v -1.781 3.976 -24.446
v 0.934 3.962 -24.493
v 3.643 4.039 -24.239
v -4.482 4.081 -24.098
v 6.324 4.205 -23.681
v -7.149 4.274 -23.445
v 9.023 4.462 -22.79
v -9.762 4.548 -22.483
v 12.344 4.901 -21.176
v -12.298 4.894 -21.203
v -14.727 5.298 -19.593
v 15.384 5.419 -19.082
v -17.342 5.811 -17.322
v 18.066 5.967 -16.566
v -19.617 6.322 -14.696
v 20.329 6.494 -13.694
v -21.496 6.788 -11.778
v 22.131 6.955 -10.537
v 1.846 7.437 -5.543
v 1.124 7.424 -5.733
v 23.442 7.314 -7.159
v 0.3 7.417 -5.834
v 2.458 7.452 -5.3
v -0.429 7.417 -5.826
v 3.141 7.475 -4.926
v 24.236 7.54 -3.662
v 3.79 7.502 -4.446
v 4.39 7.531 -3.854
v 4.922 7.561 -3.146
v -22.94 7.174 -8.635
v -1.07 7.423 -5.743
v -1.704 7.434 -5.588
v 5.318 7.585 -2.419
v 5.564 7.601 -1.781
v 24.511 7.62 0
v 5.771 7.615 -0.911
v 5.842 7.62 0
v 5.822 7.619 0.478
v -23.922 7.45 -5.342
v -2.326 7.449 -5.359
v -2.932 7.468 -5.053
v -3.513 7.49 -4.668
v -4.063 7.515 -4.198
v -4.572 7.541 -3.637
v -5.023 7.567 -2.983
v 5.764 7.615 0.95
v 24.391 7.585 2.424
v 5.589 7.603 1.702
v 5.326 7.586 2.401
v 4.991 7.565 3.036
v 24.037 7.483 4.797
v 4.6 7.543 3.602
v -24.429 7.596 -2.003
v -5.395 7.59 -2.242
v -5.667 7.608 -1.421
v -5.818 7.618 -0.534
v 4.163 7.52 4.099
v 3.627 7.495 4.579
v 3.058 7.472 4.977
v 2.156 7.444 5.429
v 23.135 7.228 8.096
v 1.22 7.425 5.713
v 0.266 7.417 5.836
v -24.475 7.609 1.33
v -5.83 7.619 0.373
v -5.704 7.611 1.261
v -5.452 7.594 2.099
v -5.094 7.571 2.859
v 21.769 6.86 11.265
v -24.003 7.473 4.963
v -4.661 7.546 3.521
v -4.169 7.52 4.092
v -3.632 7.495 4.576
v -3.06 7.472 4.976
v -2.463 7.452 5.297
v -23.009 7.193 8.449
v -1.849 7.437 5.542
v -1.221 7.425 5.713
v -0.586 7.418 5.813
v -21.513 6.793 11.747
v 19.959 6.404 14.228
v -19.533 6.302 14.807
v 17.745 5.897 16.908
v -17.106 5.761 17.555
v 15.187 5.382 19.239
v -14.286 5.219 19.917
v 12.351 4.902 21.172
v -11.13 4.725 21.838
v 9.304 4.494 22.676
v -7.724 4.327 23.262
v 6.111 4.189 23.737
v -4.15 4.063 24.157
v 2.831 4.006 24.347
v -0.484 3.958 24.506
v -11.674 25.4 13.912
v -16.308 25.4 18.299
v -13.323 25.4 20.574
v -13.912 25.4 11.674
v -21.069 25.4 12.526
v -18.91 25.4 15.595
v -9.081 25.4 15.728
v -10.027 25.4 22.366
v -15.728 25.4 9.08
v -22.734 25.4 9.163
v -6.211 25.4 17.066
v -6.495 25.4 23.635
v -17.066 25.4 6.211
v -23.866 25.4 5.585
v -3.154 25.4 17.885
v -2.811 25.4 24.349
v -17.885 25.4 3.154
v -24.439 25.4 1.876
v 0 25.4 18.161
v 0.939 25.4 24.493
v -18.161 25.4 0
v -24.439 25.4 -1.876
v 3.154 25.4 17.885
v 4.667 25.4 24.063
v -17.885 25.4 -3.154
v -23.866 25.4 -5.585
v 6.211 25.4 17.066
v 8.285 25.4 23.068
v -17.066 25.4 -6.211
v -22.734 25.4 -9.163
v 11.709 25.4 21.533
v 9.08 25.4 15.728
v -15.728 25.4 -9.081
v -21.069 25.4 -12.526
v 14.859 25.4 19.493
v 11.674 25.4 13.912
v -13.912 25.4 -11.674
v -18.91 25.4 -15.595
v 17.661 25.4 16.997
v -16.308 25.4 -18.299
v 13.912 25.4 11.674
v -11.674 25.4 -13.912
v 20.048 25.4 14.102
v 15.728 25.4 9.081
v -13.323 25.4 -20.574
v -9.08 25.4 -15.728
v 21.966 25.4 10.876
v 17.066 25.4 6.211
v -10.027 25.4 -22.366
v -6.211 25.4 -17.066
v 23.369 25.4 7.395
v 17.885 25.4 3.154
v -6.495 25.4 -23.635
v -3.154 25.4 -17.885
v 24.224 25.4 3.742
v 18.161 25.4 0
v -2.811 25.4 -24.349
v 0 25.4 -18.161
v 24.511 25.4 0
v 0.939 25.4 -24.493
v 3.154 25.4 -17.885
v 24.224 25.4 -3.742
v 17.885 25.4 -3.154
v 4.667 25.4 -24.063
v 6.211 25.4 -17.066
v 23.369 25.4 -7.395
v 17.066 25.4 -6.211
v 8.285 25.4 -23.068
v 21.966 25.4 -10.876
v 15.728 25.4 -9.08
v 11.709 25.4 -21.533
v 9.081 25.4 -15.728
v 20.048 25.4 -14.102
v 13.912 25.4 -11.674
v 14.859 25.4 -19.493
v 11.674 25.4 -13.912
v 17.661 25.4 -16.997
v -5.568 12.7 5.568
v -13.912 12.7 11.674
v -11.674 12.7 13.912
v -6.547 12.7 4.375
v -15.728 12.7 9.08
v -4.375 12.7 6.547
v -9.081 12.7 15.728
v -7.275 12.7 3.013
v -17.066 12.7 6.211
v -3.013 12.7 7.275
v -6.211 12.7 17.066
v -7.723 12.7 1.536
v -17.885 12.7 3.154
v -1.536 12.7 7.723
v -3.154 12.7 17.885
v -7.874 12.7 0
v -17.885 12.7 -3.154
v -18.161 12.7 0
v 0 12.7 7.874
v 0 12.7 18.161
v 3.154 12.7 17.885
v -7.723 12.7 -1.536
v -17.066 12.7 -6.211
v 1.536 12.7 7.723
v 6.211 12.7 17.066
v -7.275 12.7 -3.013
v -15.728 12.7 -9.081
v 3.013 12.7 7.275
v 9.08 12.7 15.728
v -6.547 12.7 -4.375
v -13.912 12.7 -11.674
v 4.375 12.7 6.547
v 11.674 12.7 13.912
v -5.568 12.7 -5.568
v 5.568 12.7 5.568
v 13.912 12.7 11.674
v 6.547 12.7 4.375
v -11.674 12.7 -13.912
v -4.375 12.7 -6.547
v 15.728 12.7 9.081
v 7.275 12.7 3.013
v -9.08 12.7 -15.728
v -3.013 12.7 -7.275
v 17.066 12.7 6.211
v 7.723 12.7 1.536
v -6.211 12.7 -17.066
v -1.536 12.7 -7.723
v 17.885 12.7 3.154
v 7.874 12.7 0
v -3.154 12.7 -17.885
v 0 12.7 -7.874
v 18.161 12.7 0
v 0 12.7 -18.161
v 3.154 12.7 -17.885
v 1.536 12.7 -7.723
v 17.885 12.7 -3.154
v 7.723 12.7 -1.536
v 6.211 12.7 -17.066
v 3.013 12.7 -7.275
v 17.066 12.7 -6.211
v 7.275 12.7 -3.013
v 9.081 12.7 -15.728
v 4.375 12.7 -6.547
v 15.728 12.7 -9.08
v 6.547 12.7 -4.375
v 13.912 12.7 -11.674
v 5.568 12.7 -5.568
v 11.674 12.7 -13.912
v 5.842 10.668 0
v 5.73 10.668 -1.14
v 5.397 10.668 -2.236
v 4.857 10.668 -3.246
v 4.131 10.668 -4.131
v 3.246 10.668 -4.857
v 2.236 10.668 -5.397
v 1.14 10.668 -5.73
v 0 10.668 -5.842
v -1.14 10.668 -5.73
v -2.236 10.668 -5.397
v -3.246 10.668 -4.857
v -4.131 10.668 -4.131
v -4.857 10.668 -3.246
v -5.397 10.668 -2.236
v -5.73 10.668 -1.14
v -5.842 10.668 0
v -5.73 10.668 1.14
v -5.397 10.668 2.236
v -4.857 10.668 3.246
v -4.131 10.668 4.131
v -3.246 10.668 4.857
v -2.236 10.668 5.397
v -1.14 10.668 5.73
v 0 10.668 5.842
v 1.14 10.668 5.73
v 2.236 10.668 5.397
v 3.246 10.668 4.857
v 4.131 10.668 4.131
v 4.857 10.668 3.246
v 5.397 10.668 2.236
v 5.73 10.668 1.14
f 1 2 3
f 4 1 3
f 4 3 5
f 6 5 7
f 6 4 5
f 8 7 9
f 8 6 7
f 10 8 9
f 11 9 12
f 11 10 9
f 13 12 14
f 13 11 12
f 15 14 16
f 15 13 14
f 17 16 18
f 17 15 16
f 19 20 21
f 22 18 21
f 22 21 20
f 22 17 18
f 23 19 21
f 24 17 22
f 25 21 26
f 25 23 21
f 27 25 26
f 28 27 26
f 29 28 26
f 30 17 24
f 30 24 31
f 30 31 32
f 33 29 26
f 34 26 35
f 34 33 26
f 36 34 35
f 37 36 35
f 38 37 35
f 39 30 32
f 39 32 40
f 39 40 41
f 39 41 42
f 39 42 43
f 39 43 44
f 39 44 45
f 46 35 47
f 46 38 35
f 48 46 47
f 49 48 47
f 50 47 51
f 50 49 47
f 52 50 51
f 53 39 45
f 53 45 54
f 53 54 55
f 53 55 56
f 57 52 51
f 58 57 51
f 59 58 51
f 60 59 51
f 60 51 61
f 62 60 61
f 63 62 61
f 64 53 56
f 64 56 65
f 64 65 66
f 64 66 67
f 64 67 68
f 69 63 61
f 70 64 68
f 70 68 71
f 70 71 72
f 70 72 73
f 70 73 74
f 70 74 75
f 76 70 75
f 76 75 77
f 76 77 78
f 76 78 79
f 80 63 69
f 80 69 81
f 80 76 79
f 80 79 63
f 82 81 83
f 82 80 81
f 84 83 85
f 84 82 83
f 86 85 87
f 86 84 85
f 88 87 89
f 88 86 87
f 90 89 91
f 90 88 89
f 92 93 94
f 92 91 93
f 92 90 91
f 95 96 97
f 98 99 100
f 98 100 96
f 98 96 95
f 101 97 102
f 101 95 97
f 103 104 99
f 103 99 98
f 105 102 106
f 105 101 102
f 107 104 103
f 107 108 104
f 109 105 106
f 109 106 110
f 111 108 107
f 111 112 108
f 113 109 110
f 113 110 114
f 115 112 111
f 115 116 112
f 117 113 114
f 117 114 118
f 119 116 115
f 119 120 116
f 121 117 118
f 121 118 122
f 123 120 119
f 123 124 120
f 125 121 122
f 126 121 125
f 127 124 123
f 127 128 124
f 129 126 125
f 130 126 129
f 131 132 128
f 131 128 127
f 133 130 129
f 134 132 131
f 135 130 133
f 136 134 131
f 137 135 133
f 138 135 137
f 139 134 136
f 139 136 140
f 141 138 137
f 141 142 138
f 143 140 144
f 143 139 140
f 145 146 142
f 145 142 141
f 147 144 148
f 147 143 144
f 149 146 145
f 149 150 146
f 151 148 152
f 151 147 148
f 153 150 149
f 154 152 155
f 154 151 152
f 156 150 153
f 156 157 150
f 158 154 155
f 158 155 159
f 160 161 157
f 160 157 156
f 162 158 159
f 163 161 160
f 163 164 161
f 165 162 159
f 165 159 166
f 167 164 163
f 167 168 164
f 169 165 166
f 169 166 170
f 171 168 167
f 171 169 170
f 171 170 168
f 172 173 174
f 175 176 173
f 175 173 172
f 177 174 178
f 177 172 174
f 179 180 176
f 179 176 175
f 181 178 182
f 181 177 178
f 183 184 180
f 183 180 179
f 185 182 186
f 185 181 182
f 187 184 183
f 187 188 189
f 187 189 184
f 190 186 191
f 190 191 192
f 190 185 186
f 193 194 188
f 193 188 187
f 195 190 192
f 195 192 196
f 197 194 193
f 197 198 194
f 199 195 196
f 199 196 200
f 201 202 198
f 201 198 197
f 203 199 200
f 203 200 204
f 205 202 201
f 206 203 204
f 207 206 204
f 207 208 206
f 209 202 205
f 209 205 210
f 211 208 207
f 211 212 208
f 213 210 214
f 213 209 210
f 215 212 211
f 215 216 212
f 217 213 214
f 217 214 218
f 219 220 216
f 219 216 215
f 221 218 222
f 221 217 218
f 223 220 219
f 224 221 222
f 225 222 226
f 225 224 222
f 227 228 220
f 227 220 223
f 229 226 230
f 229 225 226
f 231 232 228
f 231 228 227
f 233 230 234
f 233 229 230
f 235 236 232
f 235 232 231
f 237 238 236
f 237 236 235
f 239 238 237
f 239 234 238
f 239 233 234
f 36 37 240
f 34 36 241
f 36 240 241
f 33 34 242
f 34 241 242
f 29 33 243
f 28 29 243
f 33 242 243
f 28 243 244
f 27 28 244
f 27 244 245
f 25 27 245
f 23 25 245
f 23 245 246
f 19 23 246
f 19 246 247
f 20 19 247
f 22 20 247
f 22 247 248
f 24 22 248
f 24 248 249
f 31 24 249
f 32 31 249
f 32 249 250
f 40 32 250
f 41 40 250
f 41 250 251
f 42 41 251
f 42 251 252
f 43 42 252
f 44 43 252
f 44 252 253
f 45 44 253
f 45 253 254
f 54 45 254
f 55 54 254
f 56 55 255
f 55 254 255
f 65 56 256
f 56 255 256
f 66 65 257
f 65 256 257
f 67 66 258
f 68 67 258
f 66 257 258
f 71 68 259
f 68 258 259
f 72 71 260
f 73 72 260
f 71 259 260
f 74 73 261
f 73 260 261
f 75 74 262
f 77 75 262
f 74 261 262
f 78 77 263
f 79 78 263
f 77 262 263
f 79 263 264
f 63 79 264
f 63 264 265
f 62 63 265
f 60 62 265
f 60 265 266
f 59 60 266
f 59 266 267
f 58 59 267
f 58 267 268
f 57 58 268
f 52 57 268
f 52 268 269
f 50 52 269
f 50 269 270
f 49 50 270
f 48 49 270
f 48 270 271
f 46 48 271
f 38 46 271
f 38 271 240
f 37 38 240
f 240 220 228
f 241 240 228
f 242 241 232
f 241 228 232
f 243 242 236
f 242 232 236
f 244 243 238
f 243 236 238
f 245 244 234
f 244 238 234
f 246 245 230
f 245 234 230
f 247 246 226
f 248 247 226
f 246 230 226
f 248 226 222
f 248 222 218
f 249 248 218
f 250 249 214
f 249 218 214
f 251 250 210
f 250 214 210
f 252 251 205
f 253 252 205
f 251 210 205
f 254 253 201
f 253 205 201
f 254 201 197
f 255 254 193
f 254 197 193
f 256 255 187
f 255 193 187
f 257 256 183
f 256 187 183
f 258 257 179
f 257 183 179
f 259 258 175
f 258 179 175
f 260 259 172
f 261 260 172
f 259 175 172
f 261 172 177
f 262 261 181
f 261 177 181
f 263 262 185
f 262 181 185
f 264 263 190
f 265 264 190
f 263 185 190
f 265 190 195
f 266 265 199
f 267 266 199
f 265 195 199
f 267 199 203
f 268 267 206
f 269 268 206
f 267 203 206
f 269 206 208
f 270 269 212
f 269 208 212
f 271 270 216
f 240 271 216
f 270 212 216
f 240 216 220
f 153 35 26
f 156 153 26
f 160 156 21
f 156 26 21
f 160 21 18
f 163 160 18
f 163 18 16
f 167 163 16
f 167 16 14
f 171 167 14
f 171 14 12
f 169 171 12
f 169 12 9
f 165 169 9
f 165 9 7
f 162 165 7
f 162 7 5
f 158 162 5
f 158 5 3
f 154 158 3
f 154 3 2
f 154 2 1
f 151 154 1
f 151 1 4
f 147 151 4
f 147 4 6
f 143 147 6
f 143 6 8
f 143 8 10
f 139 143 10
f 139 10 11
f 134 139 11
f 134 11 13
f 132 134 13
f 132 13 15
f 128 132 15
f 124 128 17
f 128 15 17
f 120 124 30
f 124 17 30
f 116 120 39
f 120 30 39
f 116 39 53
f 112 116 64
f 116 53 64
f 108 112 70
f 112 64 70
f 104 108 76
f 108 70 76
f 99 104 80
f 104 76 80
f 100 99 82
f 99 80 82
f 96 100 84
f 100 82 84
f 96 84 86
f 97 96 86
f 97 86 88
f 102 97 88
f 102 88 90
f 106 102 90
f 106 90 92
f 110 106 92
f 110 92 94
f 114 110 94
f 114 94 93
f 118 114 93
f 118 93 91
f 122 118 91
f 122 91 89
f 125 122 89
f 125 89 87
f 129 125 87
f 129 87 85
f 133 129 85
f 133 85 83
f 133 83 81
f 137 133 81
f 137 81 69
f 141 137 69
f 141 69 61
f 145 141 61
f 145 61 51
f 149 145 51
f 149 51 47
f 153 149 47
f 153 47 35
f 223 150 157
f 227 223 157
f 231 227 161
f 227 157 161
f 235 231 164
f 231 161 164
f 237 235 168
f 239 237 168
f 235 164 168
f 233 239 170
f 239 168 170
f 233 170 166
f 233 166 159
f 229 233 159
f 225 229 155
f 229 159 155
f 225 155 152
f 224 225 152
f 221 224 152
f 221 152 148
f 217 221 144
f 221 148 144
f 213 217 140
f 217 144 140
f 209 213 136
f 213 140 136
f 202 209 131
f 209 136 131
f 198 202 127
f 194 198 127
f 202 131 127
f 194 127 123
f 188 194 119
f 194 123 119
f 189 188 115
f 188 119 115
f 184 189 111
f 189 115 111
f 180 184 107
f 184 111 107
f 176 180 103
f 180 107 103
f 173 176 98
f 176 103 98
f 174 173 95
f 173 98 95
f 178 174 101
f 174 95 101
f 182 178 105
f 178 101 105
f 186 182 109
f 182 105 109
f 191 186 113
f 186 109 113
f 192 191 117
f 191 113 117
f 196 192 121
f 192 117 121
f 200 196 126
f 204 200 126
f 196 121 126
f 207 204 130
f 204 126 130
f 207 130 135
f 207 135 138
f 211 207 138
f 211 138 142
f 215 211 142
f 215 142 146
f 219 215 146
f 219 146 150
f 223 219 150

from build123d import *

# Parameters (mm, degrees)
SKETCH2_R               = 24.511
BOSS_EXTRUDE2_DEPTH     = 25.4
SKETCH3_R               = 18.161
CUT_EXTRUDE1_DEPTH      = 12.7
SKETCH11_R              = 83.82
CUT_EXTRUDE2_DEPTH      = 41.402
CUT_EXTRUDE2_DEPTH_BACK = 42.926
SKETCH13_R              = 5.842
CUT_EXTRUDE3_DEPTH      = 42.926
CHAMFER1_SIZE           = 2.032


with BuildPart() as part:
    # Sketch2 → Boss-Extrude2 (new body)
    with BuildSketch(Plane(origin=(0, 0, 0), x_dir=(1, 0, 0), z_dir=(0, 1, 0))):
        Circle(SKETCH2_R)
    extrude(amount=BOSS_EXTRUDE2_DEPTH)

    # Sketch3 → Cut-Extrude1 (cut)
    with BuildSketch(Plane(origin=(0, 25.4, 0), x_dir=(1, 0, 0), z_dir=(0, 1, 0))):
        Circle(SKETCH3_R)
    extrude(amount=-CUT_EXTRUDE1_DEPTH, mode=Mode.SUBTRACT)

    # Sketch11 → Cut-Extrude2 (cut, two sides)
    with BuildSketch(Plane(origin=(0, 0, 0), x_dir=(0, 0, -1), z_dir=(1, 0, 0))) as cut_extrude2_sk:
        with Locations((0, -76.2)):
            Circle(SKETCH11_R)
    extrude(amount=CUT_EXTRUDE2_DEPTH, mode=Mode.SUBTRACT)
    extrude(cut_extrude2_sk.sketch, amount=-CUT_EXTRUDE2_DEPTH_BACK, mode=Mode.SUBTRACT)

    # Sketch13 → Cut-Extrude3 (cut)
    with BuildSketch(Plane(origin=(0, 12.7, 0), x_dir=(1, 0, 0), z_dir=(0, 1, 0))):
        Circle(SKETCH13_R)
    extrude(amount=-CUT_EXTRUDE3_DEPTH, mode=Mode.SUBTRACT)

    # Chamfer1
    chamfer1_edges = [part.edges().sort_by_distance(p)[0] for p in [
        (-5.842, 12.7, 0),
    ]]
    chamfer(chamfer1_edges, length=CHAMFER1_SIZE)


solid = part.part
